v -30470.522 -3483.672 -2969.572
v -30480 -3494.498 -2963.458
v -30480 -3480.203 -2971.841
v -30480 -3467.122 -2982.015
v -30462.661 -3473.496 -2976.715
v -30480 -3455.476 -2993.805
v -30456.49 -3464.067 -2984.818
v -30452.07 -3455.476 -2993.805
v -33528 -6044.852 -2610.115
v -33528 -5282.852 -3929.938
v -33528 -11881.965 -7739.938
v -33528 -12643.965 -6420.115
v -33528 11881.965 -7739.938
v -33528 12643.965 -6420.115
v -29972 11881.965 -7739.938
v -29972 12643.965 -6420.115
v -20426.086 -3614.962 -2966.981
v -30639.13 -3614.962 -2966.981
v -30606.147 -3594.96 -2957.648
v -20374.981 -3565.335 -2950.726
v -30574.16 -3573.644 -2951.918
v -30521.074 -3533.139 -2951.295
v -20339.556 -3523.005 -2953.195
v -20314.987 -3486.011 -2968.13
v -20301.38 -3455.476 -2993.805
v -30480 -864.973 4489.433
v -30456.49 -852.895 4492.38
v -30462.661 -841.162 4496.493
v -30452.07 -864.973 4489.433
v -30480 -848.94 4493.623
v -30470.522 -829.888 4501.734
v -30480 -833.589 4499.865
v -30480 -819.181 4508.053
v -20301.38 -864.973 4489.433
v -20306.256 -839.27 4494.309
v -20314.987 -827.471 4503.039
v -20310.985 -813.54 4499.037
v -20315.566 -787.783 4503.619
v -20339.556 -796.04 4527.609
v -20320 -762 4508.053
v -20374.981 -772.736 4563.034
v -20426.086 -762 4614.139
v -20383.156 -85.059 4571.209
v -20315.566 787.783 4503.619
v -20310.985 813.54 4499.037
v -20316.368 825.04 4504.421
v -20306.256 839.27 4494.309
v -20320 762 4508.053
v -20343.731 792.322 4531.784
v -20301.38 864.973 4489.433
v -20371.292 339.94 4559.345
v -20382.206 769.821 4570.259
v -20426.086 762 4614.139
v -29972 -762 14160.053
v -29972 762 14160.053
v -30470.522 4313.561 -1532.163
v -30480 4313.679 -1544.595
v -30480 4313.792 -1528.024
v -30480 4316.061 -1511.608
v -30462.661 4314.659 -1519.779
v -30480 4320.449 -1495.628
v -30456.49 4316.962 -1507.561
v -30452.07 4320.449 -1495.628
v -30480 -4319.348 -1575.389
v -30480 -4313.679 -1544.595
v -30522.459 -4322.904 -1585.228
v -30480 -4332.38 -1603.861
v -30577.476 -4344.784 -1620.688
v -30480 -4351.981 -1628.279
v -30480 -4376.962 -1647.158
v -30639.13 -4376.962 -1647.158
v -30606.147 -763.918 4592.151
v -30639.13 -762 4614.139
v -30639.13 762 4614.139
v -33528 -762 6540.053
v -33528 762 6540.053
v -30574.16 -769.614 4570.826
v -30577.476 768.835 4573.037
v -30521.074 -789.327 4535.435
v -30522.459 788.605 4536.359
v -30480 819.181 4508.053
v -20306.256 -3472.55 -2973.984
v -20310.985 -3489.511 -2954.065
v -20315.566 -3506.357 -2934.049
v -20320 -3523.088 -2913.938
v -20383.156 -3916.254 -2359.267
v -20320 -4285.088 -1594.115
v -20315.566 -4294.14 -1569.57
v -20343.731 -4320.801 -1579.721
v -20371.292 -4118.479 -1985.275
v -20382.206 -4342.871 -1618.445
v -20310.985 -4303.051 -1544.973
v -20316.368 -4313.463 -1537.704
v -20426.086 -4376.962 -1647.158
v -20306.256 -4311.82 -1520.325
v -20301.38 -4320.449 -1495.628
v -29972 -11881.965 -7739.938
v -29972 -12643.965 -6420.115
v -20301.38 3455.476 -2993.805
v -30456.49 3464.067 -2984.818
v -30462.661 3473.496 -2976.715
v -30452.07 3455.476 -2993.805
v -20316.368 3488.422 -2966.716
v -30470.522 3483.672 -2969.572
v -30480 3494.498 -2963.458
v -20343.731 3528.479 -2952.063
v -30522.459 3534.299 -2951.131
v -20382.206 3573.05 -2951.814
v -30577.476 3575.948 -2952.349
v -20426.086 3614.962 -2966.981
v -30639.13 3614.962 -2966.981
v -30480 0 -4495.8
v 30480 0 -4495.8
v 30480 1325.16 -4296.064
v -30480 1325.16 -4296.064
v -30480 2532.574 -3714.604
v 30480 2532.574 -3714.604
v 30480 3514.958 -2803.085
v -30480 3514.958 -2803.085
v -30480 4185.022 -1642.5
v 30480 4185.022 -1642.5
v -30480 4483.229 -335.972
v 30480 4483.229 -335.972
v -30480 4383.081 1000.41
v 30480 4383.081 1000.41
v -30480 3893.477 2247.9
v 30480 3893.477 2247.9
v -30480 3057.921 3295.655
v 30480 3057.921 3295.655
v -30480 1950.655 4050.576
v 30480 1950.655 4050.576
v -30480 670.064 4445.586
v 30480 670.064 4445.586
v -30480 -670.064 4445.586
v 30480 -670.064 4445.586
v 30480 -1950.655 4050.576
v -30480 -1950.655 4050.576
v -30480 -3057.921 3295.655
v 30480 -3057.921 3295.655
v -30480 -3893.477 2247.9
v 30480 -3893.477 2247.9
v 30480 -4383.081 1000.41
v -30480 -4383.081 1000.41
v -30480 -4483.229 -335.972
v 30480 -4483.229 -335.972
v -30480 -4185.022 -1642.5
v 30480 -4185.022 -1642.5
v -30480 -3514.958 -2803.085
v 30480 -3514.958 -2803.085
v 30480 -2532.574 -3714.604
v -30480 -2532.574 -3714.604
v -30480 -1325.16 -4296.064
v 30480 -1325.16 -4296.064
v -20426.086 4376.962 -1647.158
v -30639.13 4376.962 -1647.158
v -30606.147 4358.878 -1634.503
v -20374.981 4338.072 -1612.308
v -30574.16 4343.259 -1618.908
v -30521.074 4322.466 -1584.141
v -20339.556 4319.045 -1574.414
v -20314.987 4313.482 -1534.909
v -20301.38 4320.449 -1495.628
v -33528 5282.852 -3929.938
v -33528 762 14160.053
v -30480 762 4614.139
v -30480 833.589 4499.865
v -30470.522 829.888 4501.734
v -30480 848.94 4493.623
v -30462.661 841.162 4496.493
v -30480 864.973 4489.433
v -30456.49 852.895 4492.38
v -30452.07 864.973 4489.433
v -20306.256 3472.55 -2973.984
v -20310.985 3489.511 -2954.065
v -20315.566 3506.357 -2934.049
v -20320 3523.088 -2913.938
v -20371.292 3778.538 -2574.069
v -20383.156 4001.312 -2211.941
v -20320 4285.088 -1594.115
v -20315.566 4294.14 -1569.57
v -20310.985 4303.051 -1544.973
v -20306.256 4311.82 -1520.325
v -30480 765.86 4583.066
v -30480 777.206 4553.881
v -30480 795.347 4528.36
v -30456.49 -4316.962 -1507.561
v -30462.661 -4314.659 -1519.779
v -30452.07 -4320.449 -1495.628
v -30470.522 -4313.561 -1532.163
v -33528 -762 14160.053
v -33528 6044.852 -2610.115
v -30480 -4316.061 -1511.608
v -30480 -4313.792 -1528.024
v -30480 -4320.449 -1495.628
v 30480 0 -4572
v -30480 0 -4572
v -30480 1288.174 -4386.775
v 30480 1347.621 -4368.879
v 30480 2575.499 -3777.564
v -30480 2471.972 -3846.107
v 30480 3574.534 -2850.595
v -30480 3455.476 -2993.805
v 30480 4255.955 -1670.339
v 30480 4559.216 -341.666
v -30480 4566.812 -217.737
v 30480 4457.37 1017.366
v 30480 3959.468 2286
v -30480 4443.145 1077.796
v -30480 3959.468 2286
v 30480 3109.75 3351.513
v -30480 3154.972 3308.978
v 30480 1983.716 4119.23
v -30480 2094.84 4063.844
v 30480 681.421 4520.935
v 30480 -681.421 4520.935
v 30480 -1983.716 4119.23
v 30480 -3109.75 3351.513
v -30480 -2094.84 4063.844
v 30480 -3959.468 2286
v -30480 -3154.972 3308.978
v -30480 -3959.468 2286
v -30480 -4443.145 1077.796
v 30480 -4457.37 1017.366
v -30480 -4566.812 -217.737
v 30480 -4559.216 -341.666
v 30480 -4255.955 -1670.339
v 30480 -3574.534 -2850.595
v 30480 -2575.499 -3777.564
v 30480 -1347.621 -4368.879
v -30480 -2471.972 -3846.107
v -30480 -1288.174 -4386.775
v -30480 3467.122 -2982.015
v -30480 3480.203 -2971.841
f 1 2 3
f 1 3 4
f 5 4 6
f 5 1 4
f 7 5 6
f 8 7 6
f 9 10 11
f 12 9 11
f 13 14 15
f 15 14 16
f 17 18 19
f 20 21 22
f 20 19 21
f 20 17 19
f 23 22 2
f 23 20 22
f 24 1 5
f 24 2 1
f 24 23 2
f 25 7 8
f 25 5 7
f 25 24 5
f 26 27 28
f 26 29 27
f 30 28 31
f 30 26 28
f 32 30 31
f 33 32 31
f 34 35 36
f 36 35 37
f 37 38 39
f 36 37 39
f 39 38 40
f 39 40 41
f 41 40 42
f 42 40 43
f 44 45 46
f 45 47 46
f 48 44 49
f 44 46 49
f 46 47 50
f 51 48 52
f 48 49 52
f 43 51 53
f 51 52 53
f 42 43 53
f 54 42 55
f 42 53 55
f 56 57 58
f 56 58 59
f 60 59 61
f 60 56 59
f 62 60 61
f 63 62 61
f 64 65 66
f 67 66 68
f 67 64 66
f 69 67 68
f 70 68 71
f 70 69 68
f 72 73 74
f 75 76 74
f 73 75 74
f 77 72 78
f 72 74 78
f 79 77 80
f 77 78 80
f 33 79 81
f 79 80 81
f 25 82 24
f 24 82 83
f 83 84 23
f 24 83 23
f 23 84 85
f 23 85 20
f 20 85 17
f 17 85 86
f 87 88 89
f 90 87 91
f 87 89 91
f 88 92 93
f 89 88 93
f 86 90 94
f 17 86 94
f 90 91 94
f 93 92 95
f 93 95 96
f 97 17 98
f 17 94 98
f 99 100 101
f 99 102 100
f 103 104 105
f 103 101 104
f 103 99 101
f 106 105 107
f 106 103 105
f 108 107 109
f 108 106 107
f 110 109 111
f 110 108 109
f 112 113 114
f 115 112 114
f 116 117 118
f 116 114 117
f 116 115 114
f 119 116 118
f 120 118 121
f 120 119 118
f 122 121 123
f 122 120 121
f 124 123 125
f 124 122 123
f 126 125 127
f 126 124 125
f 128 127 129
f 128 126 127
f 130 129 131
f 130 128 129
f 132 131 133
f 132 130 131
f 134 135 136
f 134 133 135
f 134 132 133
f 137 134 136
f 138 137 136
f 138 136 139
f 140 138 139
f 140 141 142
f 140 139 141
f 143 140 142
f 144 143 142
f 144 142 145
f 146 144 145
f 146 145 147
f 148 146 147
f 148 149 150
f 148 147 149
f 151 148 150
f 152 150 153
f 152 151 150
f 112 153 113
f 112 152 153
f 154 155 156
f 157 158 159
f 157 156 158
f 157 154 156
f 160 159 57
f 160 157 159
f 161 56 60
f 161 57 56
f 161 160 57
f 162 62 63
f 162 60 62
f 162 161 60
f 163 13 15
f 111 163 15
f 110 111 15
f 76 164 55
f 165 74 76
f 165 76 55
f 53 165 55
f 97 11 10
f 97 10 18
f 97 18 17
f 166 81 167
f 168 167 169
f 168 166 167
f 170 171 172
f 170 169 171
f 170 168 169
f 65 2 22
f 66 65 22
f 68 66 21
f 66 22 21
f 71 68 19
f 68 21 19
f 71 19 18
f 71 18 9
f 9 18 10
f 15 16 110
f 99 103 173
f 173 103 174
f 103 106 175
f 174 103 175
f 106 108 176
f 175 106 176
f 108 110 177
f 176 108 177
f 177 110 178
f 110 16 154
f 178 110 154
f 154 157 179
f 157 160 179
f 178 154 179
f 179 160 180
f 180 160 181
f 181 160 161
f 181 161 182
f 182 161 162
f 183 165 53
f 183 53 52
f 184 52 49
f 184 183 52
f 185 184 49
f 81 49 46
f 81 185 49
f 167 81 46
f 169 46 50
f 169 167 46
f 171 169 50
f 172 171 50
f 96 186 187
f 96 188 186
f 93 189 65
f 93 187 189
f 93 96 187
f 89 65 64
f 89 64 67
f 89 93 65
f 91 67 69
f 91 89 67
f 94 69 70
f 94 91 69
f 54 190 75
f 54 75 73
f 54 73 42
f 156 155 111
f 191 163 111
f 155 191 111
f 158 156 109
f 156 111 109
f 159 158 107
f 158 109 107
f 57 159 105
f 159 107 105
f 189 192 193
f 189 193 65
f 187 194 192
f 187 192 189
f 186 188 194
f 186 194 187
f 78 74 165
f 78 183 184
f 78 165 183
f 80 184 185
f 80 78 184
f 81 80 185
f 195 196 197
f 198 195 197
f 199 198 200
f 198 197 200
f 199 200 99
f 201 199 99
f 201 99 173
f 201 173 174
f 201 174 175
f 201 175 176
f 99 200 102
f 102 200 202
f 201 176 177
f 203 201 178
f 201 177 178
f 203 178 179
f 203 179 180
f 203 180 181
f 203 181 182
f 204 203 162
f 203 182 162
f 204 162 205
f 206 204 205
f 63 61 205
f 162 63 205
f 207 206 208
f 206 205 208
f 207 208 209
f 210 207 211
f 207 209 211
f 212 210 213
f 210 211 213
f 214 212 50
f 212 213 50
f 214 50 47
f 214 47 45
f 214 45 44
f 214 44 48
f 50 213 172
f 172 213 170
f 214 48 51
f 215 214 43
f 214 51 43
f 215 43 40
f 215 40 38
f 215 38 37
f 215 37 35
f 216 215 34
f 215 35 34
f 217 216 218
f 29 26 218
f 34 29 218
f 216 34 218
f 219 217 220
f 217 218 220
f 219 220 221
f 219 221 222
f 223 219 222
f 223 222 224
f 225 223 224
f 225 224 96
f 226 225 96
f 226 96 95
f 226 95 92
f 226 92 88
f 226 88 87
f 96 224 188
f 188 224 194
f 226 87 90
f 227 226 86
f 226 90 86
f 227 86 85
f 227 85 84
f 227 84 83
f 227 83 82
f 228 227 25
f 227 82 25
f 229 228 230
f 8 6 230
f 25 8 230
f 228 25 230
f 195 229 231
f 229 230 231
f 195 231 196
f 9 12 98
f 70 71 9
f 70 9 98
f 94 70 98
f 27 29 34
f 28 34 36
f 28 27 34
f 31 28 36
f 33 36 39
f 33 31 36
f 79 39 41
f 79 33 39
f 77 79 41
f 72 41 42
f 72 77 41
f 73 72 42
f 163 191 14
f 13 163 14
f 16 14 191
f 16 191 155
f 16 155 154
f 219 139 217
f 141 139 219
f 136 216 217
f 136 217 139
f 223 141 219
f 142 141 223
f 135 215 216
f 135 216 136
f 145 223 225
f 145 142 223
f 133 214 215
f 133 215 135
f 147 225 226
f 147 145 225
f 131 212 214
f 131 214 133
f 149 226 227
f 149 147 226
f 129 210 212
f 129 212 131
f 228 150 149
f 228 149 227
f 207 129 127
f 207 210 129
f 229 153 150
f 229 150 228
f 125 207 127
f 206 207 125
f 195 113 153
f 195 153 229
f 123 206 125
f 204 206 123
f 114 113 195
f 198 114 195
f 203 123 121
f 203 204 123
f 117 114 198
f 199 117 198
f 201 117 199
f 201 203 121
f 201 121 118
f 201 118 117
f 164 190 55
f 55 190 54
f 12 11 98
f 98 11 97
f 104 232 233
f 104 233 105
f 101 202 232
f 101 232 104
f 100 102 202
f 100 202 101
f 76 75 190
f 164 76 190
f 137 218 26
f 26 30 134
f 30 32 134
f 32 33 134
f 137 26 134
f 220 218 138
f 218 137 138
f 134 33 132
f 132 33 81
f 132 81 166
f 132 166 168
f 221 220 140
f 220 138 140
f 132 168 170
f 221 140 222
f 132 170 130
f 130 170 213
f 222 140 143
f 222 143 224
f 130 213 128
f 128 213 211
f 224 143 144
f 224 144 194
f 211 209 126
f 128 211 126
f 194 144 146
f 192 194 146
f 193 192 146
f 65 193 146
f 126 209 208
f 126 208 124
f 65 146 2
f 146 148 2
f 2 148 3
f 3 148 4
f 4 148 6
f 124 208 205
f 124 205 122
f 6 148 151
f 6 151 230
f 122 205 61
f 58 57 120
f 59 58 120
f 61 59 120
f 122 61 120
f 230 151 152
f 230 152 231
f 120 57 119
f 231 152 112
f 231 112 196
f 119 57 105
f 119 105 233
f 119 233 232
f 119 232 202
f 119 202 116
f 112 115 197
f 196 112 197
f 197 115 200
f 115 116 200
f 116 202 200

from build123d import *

# Parameters (mm, degrees)
BOSS_EXTRUDE1_DEPTH      = 30480
BOSS_EXTRUDE1_DEPTH_BACK = 30480
SKETCH1_R                = 4572
SHELL1_T                 = -76.2
LOFT2_START              = -762
LOFT2_DEPTH              = 1524
FILLET1_R                = 127
CIRPATTERN1_COUNT        = 3
FILLET1_OF_CIRPATTERN1_R = 127


# Read off the part's stored shape, not the designer's step: Loft2
with BuildPart() as part:
    # Sketch1 → Boss-Extrude1 (new, two sides: drawn at the far end of the back side and taken through both)
    with BuildSketch(Plane(origin=(0, 0, 0), x_dir=(0, 0, -1), z_dir=(1, 0, 0)).offset(-BOSS_EXTRUDE1_DEPTH_BACK)):
        Circle(SKETCH1_R)
    extrude(amount=BOSS_EXTRUDE1_DEPTH + BOSS_EXTRUDE1_DEPTH_BACK)

    # Shell1
    shell1_openings = [part.faces().sort_by_distance(p)[0] for p in [
        (-30480, 0, 0),
        (30480, 0, 0),
    ]]
    offset(amount=SHELL1_T, openings=shell1_openings, kind=Kind.INTERSECTION)

    # Loft2 outline → Loft2 (add)
    with BuildSketch(Plane(origin=(0, 0, 0), x_dir=(1, 0, 0), z_dir=(0, 1, 0)).offset(LOFT2_START)):
        Polygon((-30478.420807917, -4507), (-33528, -6540.052794722), (-33528, -14160.052794722), (-29972, -14160.052794722), (-20318.947205278, -4507), align=None)
    loft2 = extrude(amount=LOFT2_DEPTH)

    # Fillet1
    # the kernel refuses this fillet: 127 mm, written as the material it adds along each edge
    with BuildSketch(Plane(origin=(-30745.215862307, 762, 4508.052794722), x_dir=(0, 0.9840414147079701, -0.1779395800251785), z_dir=(1, 0, 0))) as fillet1_piece_1_section:
        with BuildLine():
            CenterArc((106.096300006, 126.991683602), FILLET1_R, 190.249769112, 79.094530003)
            Line((-18.876959662, 104.393356939), (0, 0))
            ThreePointArc((0, 0), (52.321463017, 0.299390324), (104.642926033, 0))
        make_face()
    fillet1_piece_1 = extrude(amount=10690.431724613, mode=Mode.PRIVATE)
    fillet1_piece_1 = split(fillet1_piece_1, bisect_by=Plane(origin=(-30480, 769.527173965, 4556.423529059), z_dir=(-1, 0, 0)), keep=Keep.TOP, mode=Mode.PRIVATE)
    fillet1_piece_1 = split(fillet1_piece_1, bisect_by=Plane(origin=(-30527.440527907, 769.527173965, 4539.679813327), z_dir=(0.5547001962252289, 0, 0.8320502943378439)), keep=Keep.TOP, mode=Mode.PRIVATE)
    add(fillet1_piece_1)
    with BuildSketch(Plane(origin=(-30480, 762, 4508.052794722), x_dir=(0, 0.9840414147079701, -0.17793958002517812), z_dir=(1, 0, 0))) as fillet1_piece_2_section:
        with BuildLine():
            CenterArc((106.096300006, 126.991683602), FILLET1_R, 190.249769112, 79.094530003)
            Line((-18.876959662, 104.393356939), (0, 0))
            ThreePointArc((0, 0), (52.321463017, 0.299390324), (104.642926033, 0))
        make_face()
    fillet1_piece_2 = extrude(amount=10425.215862307, mode=Mode.PRIVATE)
    fillet1_piece_2 = split(fillet1_piece_2, bisect_by=Plane(origin=(-30469.277434704, 825.457396933, 4500.904417858), z_dir=(-0.5547001962252289, 0, -0.8320502943378439)), keep=Keep.TOP, mode=Mode.PRIVATE)
    add(fillet1_piece_2)
    with BuildSketch(Plane(origin=(-30480, 762, 4508.052794722), x_dir=(0, 0.9840414147079701, -0.17793958002517812), z_dir=(1, 0, 0))) as fillet1_piece_3_section:
        with BuildLine():
            CenterArc((106.096300006, 126.991683602), FILLET1_R, 190.249769112, 79.094530003)
            Line((-18.876959662, 104.393356939), (0, 0))
            ThreePointArc((0, 0), (52.321463017, 0.299390324), (104.642926033, 0))
        make_face()
    fillet1_piece_3 = extrude(amount=10425.215862307, mode=Mode.PRIVATE)
    fillet1_piece_3 = split(fillet1_piece_3, bisect_by=Plane(origin=(-22874.041619901, 784.931098552, 7062.094414623), z_dir=(-0.7071067811865476, 0, -0.7071067811865476)), keep=Keep.TOP, mode=Mode.PRIVATE)
    fillet1_piece_3 = split(fillet1_piece_3, bisect_by=Plane(origin=(-26977.987627207, 784.931098552, 2173.377879526), z_dir=(0.5547001962252289, 0, 0.8320502943378439)), keep=Keep.TOP, mode=Mode.PRIVATE)
    add(fillet1_piece_3)
    with BuildSketch(Plane(origin=(-30745.215862307, -762, 4508.052794722), x_dir=(0, -0.9840414147079707, -0.17793958002517546), z_dir=(1, 0, 0))) as fillet1_piece_4_section:
        with BuildLine():
            CenterArc((106.096300006, -126.991683602), FILLET1_R, 90.655700885, 79.094530003)
            Line((-18.876959662, -104.393356939), (0, 0))
            ThreePointArc((0, 0), (52.321463017, -0.299390324), (104.642926033, 0))
        make_face()
    fillet1_piece_4 = extrude(amount=10690.431724613, mode=Mode.PRIVATE)
    fillet1_piece_4 = split(fillet1_piece_4, bisect_by=Plane(origin=(-30480, -769.527173965, 4556.423529059), z_dir=(-1, 0, 0)), keep=Keep.TOP, mode=Mode.PRIVATE)
    fillet1_piece_4 = split(fillet1_piece_4, bisect_by=Plane(origin=(-30527.440527907, -769.527173965, 4539.679813327), z_dir=(0.5547001962252289, 0, 0.8320502943378439)), keep=Keep.TOP, mode=Mode.PRIVATE)
    add(fillet1_piece_4)
    with BuildSketch(Plane(origin=(-30480, -762, 4508.052794722), x_dir=(0, -0.9840414147079704, -0.1779395800251768), z_dir=(1, 0, 0))) as fillet1_piece_5_section:
        with BuildLine():
            CenterArc((106.096300006, -126.991683602), FILLET1_R, 90.655700885, 79.094530003)
            Line((-18.876959662, -104.393356939), (0, 0))
            ThreePointArc((0, 0), (52.321463017, -0.299390324), (104.642926033, 0))
        make_face()
    fillet1_piece_5 = extrude(amount=10425.215862307, mode=Mode.PRIVATE)
    fillet1_piece_5 = split(fillet1_piece_5, bisect_by=Plane(origin=(-30469.277434704, -825.457396933, 4500.904417858), z_dir=(-0.5547001962252289, 0, -0.8320502943378439)), keep=Keep.TOP, mode=Mode.PRIVATE)
    add(fillet1_piece_5)
    with BuildSketch(Plane(origin=(-30480, -762, 4508.052794722), x_dir=(0, -0.9840414147079704, -0.1779395800251768), z_dir=(1, 0, 0))) as fillet1_piece_6_section:
        with BuildLine():
            CenterArc((106.096300006, -126.991683602), FILLET1_R, 90.655700885, 79.094530003)
            Line((-18.876959662, -104.393356939), (0, 0))
            ThreePointArc((0, 0), (52.321463017, -0.299390324), (104.642926033, 0))
        make_face()
    fillet1_piece_6 = extrude(amount=10425.215862307, mode=Mode.PRIVATE)
    fillet1_piece_6 = split(fillet1_piece_6, bisect_by=Plane(origin=(-22874.041619901, -784.931098552, 7062.094414623), z_dir=(-0.7071067811865476, 0, -0.7071067811865476)), keep=Keep.TOP, mode=Mode.PRIVATE)
    fillet1_piece_6 = split(fillet1_piece_6, bisect_by=Plane(origin=(-26977.987627207, -784.931098552, 2173.377879526), z_dir=(0.5547001962252289, 0, 0.8320502943378439)), keep=Keep.TOP, mode=Mode.PRIVATE)
    add(fillet1_piece_6)

    # CirPattern1: Loft2 ×3 about axis
    cirpattern1_axis = Axis((0, 0, 0), (1, 0, 0))
    for i in range(1, CIRPATTERN1_COUNT):
        add(loft2.rotate(cirpattern1_axis, i * 360 / CIRPATTERN1_COUNT))

    # Fillet1 of CirPattern1
    # the kernel refuses this fillet: 127 mm, written as the material it adds along each edge
    with BuildSketch(Plane(origin=(-20054.784137693, -4285.088241831, -1594.115039677), x_dir=(0, -0.33792051071345414, 0.9411746535256664), z_dir=(-1, 0, 0))) as fillet1_of_cirpattern1_piece_1_section:
        with BuildLine():
            CenterArc((106.096300006, -126.991683602), FILLET1_OF_CIRPATTERN1_R, 90.655700885, 79.094530003)
            Line((-18.876959662, -104.393356939), (0, 0))
            ThreePointArc((0, 0), (52.321463017, -0.299390324), (104.642926033, 0))
        make_face()
    fillet1_of_cirpattern1_piece_1 = extrude(amount=10425.215862307, mode=Mode.PRIVATE)
    fillet1_of_cirpattern1_piece_1 = split(fillet1_of_cirpattern1_piece_1, bisect_by=Plane(origin=(-22874.041619902, -6508.418716264, -2851.276935745), z_dir=(-0.7071067811865476, 0.6123724356957947, 0.3535533905932737)), keep=Keep.TOP, mode=Mode.PRIVATE)
    fillet1_of_cirpattern1_piece_1 = split(fillet1_of_cirpattern1_piece_1, bisect_by=Plane(origin=(-26977.987627207, -2274.666004969, -406.918668197), z_dir=(0.5547001962252289, -0.7205766921228924, -0.41602514716892186)), keep=Keep.TOP, mode=Mode.PRIVATE)
    add(fillet1_of_cirpattern1_piece_1)
    with BuildSketch(Plane(origin=(-20054.784137693, -4285.088241831, -1594.115039677), x_dir=(0, -0.33792051071345414, 0.9411746535256664), z_dir=(-1, 0, 0))) as fillet1_of_cirpattern1_piece_2_section:
        with BuildLine():
            CenterArc((106.096300006, -126.991683602), FILLET1_OF_CIRPATTERN1_R, 90.655700885, 79.094530003)
            Line((-18.876959662, -104.393356939), (0, 0))
            ThreePointArc((0, 0), (52.321463017, -0.299390324), (104.642926033, 0))
        make_face()
    fillet1_of_cirpattern1_piece_2 = extrude(amount=10690.431724613, mode=Mode.PRIVATE)
    fillet1_of_cirpattern1_piece_2 = split(fillet1_of_cirpattern1_piece_2, bisect_by=Plane(origin=(-30480, -4330.742113549, -1611.781682973), z_dir=(-1, 0, 0)), keep=Keep.TOP, mode=Mode.PRIVATE)
    fillet1_of_cirpattern1_piece_2 = split(fillet1_of_cirpattern1_piece_2, bisect_by=Plane(origin=(-30527.440527907, -4316.241630371, -1603.409825107), z_dir=(0.5547001962252289, -0.7205766921228924, -0.41602514716892186)), keep=Keep.TOP, mode=Mode.PRIVATE)
    add(fillet1_of_cirpattern1_piece_2)
    with BuildSketch(Plane(origin=(-20054.784137693, -4285.088241831, -1594.115039677), x_dir=(0, -0.33792051071345414, 0.9411746535256664), z_dir=(-1, 0, 0))) as fillet1_of_cirpattern1_piece_3_section:
        with BuildLine():
            CenterArc((106.096300006, -126.991683602), FILLET1_OF_CIRPATTERN1_R, 90.655700885, 79.094530003)
            Line((-18.876959662, -104.393356939), (0, 0))
            ThreePointArc((0, 0), (52.321463017, -0.299390324), (104.642926033, 0))
        make_face()
    fillet1_of_cirpattern1_piece_3 = extrude(amount=10425.215862307, mode=Mode.PRIVATE)
    fillet1_of_cirpattern1_piece_3 = split(fillet1_of_cirpattern1_piece_3, bisect_by=Plane(origin=(-30469.277434703, -4310.626264337, -1535.585133443), z_dir=(-0.5547001962252289, 0.7205766921228924, 0.41602514716892186)), keep=Keep.TOP, mode=Mode.PRIVATE)
    add(fillet1_of_cirpattern1_piece_3)
    with BuildSketch(Plane(origin=(-20054.784137693, -3523.088241831, -2913.937755045), x_dir=(0, 0.646120903994517, -0.7632350735004965), z_dir=(-1, 0, 0))) as fillet1_of_cirpattern1_piece_4_section:
        with BuildLine():
            CenterArc((106.096300006, 126.991683602), FILLET1_OF_CIRPATTERN1_R, 190.249769112, 79.094530003)
            Line((-18.876959662, 104.393356939), (0, 0))
            ThreePointArc((0, 0), (52.321463017, 0.299390324), (104.642926033, 0))
        make_face()
    fillet1_of_cirpattern1_piece_4 = extrude(amount=10425.215862307, mode=Mode.PRIVATE)
    fillet1_of_cirpattern1_piece_4 = split(fillet1_of_cirpattern1_piece_4, bisect_by=Plane(origin=(-22874.041619901, -5723.487617712, -4210.817478878), z_dir=(-0.7071067811865476, 0.6123724356957947, 0.3535533905932737)), keep=Keep.TOP, mode=Mode.PRIVATE)
    fillet1_of_cirpattern1_piece_4 = split(fillet1_of_cirpattern1_piece_4, bisect_by=Plane(origin=(-26977.987627206, -1489.734906417, -1766.45921133), z_dir=(0.5547001962252289, -0.7205766921228924, -0.41602514716892186)), keep=Keep.TOP, mode=Mode.PRIVATE)
    add(fillet1_of_cirpattern1_piece_4)
    with BuildSketch(Plane(origin=(-20054.784137693, -3523.088241831, -2913.937755045), x_dir=(0, 0.646120903994517, -0.7632350735004965), z_dir=(-1, 0, 0))) as fillet1_of_cirpattern1_piece_5_section:
        with BuildLine():
            CenterArc((106.096300006, 126.991683602), FILLET1_OF_CIRPATTERN1_R, 190.249769112, 79.094530003)
            Line((-18.876959662, 104.393356939), (0, 0))
            ThreePointArc((0, 0), (52.321463017, 0.299390324), (104.642926033, 0))
        make_face()
    fillet1_of_cirpattern1_piece_5 = extrude(amount=10690.431724613, mode=Mode.PRIVATE)
    fillet1_of_cirpattern1_piece_5 = split(fillet1_of_cirpattern1_piece_5, bisect_by=Plane(origin=(-30480, -3561.214939584, -2944.641846085), z_dir=(-1, 0, 0)), keep=Keep.TOP, mode=Mode.PRIVATE)
    fillet1_of_cirpattern1_piece_5 = split(fillet1_of_cirpattern1_piece_5, bisect_by=Plane(origin=(-30527.440527907, -3546.714456406, -2936.269988219), z_dir=(0.5547001962252289, -0.7205766921228924, -0.41602514716892186)), keep=Keep.TOP, mode=Mode.PRIVATE)
    add(fillet1_of_cirpattern1_piece_5)
    with BuildSketch(Plane(origin=(-20054.784137693, -3523.088241831, -2913.937755045), x_dir=(0, 0.646120903994517, -0.7632350735004965), z_dir=(-1, 0, 0))) as fillet1_of_cirpattern1_piece_6_section:
        with BuildLine():
            CenterArc((106.096300006, 126.991683602), FILLET1_OF_CIRPATTERN1_R, 190.249769112, 79.094530003)
            Line((-18.876959662, 104.393356939), (0, 0))
            ThreePointArc((0, 0), (52.321463017, 0.299390324), (104.642926033, 0))
        make_face()
    fillet1_of_cirpattern1_piece_6 = extrude(amount=10425.215862307, mode=Mode.PRIVATE)
    fillet1_of_cirpattern1_piece_6 = split(fillet1_of_cirpattern1_piece_6, bisect_by=Plane(origin=(-30469.277434703, -3485.168867404, -2965.319284414), z_dir=(-0.5547001962252289, 0.7205766921228924, 0.41602514716892186)), keep=Keep.TOP, mode=Mode.PRIVATE)
    add(fillet1_of_cirpattern1_piece_6)
    with BuildSketch(Plane(origin=(-20054.784137693, 3523.088241831, -2913.937755045), x_dir=(0, -0.6461209039945224, -0.7632350735004917), z_dir=(-1, 0, 0))) as fillet1_of_cirpattern1_piece_7_section:
        with BuildLine():
            CenterArc((106.096300006, -126.991683602), FILLET1_OF_CIRPATTERN1_R, 90.655700885, 79.094530003)
            Line((-18.876959662, -104.393356939), (0, 0))
            ThreePointArc((0, 0), (52.321463017, -0.299390324), (104.642926033, 0))
        make_face()
    fillet1_of_cirpattern1_piece_7 = extrude(amount=10425.215862307, mode=Mode.PRIVATE)
    fillet1_of_cirpattern1_piece_7 = split(fillet1_of_cirpattern1_piece_7, bisect_by=Plane(origin=(-22874.041619902, 5723.487617712, -4210.817478878), z_dir=(-0.7071067811865476, -0.6123724356957944, 0.3535533905932741)), keep=Keep.TOP, mode=Mode.PRIVATE)
    fillet1_of_cirpattern1_piece_7 = split(fillet1_of_cirpattern1_piece_7, bisect_by=Plane(origin=(-26977.987627207, 1489.734906417, -1766.45921133), z_dir=(0.5547001962252289, 0.7205766921228921, -0.41602514716892236)), keep=Keep.TOP, mode=Mode.PRIVATE)
    add(fillet1_of_cirpattern1_piece_7)
    with BuildSketch(Plane(origin=(-20054.784137693, 3523.088241831, -2913.937755045), x_dir=(0, -0.6461209039945224, -0.7632350735004917), z_dir=(-1, 0, 0))) as fillet1_of_cirpattern1_piece_8_section:
        with BuildLine():
            CenterArc((106.096300006, -126.991683602), FILLET1_OF_CIRPATTERN1_R, 90.655700885, 79.094530003)
            Line((-18.876959662, -104.393356939), (0, 0))
            ThreePointArc((0, 0), (52.321463017, -0.299390324), (104.642926033, 0))
        make_face()
    fillet1_of_cirpattern1_piece_8 = extrude(amount=10690.431724613, mode=Mode.PRIVATE)
    fillet1_of_cirpattern1_piece_8 = split(fillet1_of_cirpattern1_piece_8, bisect_by=Plane(origin=(-30480, 3561.214939584, -2944.641846085), z_dir=(-1, 0, 0)), keep=Keep.TOP, mode=Mode.PRIVATE)
    fillet1_of_cirpattern1_piece_8 = split(fillet1_of_cirpattern1_piece_8, bisect_by=Plane(origin=(-30527.440527907, 3546.714456406, -2936.269988219), z_dir=(0.5547001962252289, 0.7205766921228921, -0.41602514716892236)), keep=Keep.TOP, mode=Mode.PRIVATE)
    add(fillet1_of_cirpattern1_piece_8)
    with BuildSketch(Plane(origin=(-20054.784137693, 3523.088241831, -2913.937755045), x_dir=(0, -0.6461209039945224, -0.7632350735004917), z_dir=(-1, 0, 0))) as fillet1_of_cirpattern1_piece_9_section:
        with BuildLine():
            CenterArc((106.096300006, -126.991683602), FILLET1_OF_CIRPATTERN1_R, 90.655700885, 79.094530003)
            Line((-18.876959662, -104.393356939), (0, 0))
            ThreePointArc((0, 0), (52.321463017, -0.299390324), (104.642926033, 0))
        make_face()
    fillet1_of_cirpattern1_piece_9 = extrude(amount=10425.215862307, mode=Mode.PRIVATE)
    fillet1_of_cirpattern1_piece_9 = split(fillet1_of_cirpattern1_piece_9, bisect_by=Plane(origin=(-30469.277434703, 3485.168867404, -2965.319284414), z_dir=(-0.5547001962252289, -0.7205766921228921, 0.41602514716892236)), keep=Keep.TOP, mode=Mode.PRIVATE)
    add(fillet1_of_cirpattern1_piece_9)
    with BuildSketch(Plane(origin=(-20054.784137693, 4285.088241831, -1594.115039677), x_dir=(0, 0.33792051071345486, 0.9411746535256663), z_dir=(-1, 0, 0))) as fillet1_of_cirpattern1_piece_10_section:
        with BuildLine():
            CenterArc((106.096300006, 126.991683602), FILLET1_OF_CIRPATTERN1_R, 190.249769112, 79.094530003)
            Line((-18.876959662, 104.393356939), (0, 0))
            ThreePointArc((0, 0), (52.321463017, 0.299390324), (104.642926033, 0))
        make_face()
    fillet1_of_cirpattern1_piece_10 = extrude(amount=10425.215862307, mode=Mode.PRIVATE)
    fillet1_of_cirpattern1_piece_10 = split(fillet1_of_cirpattern1_piece_10, bisect_by=Plane(origin=(-22874.041619901, 6508.418716264, -2851.276935745), z_dir=(-0.7071067811865476, -0.6123724356957944, 0.3535533905932741)), keep=Keep.TOP, mode=Mode.PRIVATE)
    fillet1_of_cirpattern1_piece_10 = split(fillet1_of_cirpattern1_piece_10, bisect_by=Plane(origin=(-26977.987627207, 2274.666004969, -406.918668197), z_dir=(0.5547001962252289, 0.7205766921228921, -0.41602514716892236)), keep=Keep.TOP, mode=Mode.PRIVATE)
    add(fillet1_of_cirpattern1_piece_10)
    with BuildSketch(Plane(origin=(-20054.784137693, 4285.088241831, -1594.115039677), x_dir=(0, 0.33792051071345486, 0.9411746535256663), z_dir=(-1, 0, 0))) as fillet1_of_cirpattern1_piece_11_section:
        with BuildLine():
            CenterArc((106.096300006, 126.991683602), FILLET1_OF_CIRPATTERN1_R, 190.249769112, 79.094530003)
            Line((-18.876959662, 104.393356939), (0, 0))
            ThreePointArc((0, 0), (52.321463017, 0.299390324), (104.642926033, 0))
        make_face()
    fillet1_of_cirpattern1_piece_11 = extrude(amount=10690.431724613, mode=Mode.PRIVATE)
    fillet1_of_cirpattern1_piece_11 = split(fillet1_of_cirpattern1_piece_11, bisect_by=Plane(origin=(-30480, 4330.742113549, -1611.781682973), z_dir=(-1, 0, 0)), keep=Keep.TOP, mode=Mode.PRIVATE)
    fillet1_of_cirpattern1_piece_11 = split(fillet1_of_cirpattern1_piece_11, bisect_by=Plane(origin=(-30527.440527907, 4316.241630371, -1603.409825107), z_dir=(0.5547001962252289, 0.7205766921228921, -0.41602514716892236)), keep=Keep.TOP, mode=Mode.PRIVATE)
    add(fillet1_of_cirpattern1_piece_11)
    with BuildSketch(Plane(origin=(-20054.784137693, 4285.088241831, -1594.115039677), x_dir=(0, 0.33792051071345486, 0.9411746535256663), z_dir=(-1, 0, 0))) as fillet1_of_cirpattern1_piece_12_section:
        with BuildLine():
            CenterArc((106.096300006, 126.991683602), FILLET1_OF_CIRPATTERN1_R, 190.249769112, 79.094530003)
            Line((-18.876959662, 104.393356939), (0, 0))
            ThreePointArc((0, 0), (52.321463017, 0.299390324), (104.642926033, 0))
        make_face()
    fillet1_of_cirpattern1_piece_12 = extrude(amount=10425.215862307, mode=Mode.PRIVATE)
    fillet1_of_cirpattern1_piece_12 = split(fillet1_of_cirpattern1_piece_12, bisect_by=Plane(origin=(-30469.277434703, 4310.626264337, -1535.585133443), z_dir=(-0.5547001962252289, -0.7205766921228921, 0.41602514716892236)), keep=Keep.TOP, mode=Mode.PRIVATE)
    add(fillet1_of_cirpattern1_piece_12)


solid = part.part
